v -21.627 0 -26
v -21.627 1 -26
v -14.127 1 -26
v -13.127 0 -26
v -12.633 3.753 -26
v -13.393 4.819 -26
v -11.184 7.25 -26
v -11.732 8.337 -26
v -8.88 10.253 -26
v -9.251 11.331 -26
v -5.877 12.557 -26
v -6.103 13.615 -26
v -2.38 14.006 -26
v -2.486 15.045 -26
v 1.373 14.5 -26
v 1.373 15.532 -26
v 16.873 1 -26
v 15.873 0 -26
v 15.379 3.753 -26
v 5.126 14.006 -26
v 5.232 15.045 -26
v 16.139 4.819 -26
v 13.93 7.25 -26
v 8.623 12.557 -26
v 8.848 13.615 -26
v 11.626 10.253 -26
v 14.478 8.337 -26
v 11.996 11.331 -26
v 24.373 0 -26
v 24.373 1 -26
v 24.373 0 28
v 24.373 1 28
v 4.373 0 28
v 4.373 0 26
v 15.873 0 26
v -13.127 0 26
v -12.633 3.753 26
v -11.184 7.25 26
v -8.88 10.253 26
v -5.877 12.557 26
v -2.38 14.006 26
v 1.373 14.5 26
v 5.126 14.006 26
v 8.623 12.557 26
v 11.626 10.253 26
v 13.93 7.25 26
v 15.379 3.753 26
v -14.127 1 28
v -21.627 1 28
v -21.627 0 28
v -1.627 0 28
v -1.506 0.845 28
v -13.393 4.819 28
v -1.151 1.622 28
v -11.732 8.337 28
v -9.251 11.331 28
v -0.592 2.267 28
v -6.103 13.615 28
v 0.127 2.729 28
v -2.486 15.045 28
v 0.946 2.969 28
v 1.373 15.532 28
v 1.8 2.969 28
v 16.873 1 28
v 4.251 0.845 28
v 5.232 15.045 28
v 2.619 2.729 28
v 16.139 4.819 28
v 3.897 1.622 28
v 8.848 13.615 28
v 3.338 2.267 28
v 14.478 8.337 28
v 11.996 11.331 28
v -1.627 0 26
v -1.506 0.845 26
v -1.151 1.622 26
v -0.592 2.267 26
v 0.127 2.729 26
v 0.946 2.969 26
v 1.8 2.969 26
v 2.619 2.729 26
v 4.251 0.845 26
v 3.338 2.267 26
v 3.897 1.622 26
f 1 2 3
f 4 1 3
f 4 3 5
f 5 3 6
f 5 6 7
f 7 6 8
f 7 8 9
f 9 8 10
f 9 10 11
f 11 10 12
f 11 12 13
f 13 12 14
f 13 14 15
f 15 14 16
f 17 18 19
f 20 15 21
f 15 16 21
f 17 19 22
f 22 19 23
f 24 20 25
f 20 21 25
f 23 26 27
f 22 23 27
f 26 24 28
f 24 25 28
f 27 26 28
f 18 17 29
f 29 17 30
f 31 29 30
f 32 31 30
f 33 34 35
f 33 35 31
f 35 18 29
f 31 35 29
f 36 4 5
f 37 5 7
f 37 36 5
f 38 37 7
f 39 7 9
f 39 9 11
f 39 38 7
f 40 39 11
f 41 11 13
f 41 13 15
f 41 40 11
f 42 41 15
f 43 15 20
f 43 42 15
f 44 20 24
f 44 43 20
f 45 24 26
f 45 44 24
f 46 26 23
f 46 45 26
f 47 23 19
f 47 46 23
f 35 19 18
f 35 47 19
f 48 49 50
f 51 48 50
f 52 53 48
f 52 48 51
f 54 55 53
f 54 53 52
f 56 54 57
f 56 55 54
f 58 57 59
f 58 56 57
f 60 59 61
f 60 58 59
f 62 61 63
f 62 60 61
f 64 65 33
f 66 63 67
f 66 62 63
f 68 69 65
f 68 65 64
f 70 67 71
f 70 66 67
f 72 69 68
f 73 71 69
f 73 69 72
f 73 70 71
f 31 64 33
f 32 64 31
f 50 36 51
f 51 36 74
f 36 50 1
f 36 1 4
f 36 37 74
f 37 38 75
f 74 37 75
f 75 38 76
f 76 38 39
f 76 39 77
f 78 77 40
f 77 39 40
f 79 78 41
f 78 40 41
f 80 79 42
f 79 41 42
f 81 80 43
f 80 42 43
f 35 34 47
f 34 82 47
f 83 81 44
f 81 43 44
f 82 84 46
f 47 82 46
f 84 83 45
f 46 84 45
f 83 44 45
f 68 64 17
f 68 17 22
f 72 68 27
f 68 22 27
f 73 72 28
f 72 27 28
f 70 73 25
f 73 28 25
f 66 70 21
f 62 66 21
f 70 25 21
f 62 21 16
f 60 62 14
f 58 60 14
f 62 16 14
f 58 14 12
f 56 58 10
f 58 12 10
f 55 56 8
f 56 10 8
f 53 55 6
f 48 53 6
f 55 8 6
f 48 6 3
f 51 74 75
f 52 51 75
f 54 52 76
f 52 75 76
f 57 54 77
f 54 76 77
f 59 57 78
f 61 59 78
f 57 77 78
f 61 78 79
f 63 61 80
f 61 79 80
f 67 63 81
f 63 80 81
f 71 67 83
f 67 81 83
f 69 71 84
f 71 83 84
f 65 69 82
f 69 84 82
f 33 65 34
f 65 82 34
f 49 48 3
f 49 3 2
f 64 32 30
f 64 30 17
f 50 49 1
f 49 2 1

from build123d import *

# Parameters (mm, degrees)
F1_DEPTH = 26
F3_DEPTH = 2


with BuildPart() as f1:
    # F0 (on Top) → F1 (new body, symmetric)
    with BuildSketch(Plane.XY):
        with BuildLine():
            Line((-21.6270365771, 1), (-21.6270365771, 0))
            Line((-21.6270365771, 0), (-13.1270365771, 0))
            ThreePointArc((-13.1270365771, 0), (1.3729634229, 14.5), (15.8729634229, 0))
            Line((15.8729634229, 0), (24.3729634229, 0))
            Line((24.3729634229, 0), (24.3729634229, 1))
            Line((24.3729634229, 1), (16.8729634229, 1))
            ThreePointArc((16.8729634229, 1), (1.3729634229, 15.532224567), (-14.1270365771, 1))
            Line((-14.1270365771, 1), (-21.6270365771, 1))
        make_face()
    extrude(amount=F1_DEPTH, both=True)

    # F2 (on face) → F3 (join)
    with BuildSketch(Plane.XY.offset(26)):
        with BuildLine():
            ThreePointArc((-13.1270365771, 0), (1.3729634229, 14.5), (15.8729634229, 0))
            Line((15.8729634229, 0), (24.3729634229, 0))
            Line((24.3729634229, 0), (24.3729634229, 1))
            Line((24.3729634229, 1), (16.8729634229, 1))
            ThreePointArc((16.8729634229, 1), (1.3729634229, 15.532224567), (-14.1270365771, 1))
            Line((-14.1270365771, 1), (-21.6270365771, 1))
            Line((-21.6270365771, 1), (-21.6270365771, 0))
            Line((-21.6270365771, 0), (-13.1270365771, 0))
        make_face()
        with BuildLine():
            ThreePointArc((-1.6270365771, 0), (1.3729634229, 3), (4.3729634229, 0))
            Line((4.3729634229, 0), (15.8729634229, 0))
            ThreePointArc((15.8729634229, 0), (1.3729634229, 14.5), (-13.1270365771, 0))
            Line((-13.1270365771, 0), (-1.6270365771, 0))
        make_face()
    extrude(amount=F3_DEPTH)


solid = f1.part
